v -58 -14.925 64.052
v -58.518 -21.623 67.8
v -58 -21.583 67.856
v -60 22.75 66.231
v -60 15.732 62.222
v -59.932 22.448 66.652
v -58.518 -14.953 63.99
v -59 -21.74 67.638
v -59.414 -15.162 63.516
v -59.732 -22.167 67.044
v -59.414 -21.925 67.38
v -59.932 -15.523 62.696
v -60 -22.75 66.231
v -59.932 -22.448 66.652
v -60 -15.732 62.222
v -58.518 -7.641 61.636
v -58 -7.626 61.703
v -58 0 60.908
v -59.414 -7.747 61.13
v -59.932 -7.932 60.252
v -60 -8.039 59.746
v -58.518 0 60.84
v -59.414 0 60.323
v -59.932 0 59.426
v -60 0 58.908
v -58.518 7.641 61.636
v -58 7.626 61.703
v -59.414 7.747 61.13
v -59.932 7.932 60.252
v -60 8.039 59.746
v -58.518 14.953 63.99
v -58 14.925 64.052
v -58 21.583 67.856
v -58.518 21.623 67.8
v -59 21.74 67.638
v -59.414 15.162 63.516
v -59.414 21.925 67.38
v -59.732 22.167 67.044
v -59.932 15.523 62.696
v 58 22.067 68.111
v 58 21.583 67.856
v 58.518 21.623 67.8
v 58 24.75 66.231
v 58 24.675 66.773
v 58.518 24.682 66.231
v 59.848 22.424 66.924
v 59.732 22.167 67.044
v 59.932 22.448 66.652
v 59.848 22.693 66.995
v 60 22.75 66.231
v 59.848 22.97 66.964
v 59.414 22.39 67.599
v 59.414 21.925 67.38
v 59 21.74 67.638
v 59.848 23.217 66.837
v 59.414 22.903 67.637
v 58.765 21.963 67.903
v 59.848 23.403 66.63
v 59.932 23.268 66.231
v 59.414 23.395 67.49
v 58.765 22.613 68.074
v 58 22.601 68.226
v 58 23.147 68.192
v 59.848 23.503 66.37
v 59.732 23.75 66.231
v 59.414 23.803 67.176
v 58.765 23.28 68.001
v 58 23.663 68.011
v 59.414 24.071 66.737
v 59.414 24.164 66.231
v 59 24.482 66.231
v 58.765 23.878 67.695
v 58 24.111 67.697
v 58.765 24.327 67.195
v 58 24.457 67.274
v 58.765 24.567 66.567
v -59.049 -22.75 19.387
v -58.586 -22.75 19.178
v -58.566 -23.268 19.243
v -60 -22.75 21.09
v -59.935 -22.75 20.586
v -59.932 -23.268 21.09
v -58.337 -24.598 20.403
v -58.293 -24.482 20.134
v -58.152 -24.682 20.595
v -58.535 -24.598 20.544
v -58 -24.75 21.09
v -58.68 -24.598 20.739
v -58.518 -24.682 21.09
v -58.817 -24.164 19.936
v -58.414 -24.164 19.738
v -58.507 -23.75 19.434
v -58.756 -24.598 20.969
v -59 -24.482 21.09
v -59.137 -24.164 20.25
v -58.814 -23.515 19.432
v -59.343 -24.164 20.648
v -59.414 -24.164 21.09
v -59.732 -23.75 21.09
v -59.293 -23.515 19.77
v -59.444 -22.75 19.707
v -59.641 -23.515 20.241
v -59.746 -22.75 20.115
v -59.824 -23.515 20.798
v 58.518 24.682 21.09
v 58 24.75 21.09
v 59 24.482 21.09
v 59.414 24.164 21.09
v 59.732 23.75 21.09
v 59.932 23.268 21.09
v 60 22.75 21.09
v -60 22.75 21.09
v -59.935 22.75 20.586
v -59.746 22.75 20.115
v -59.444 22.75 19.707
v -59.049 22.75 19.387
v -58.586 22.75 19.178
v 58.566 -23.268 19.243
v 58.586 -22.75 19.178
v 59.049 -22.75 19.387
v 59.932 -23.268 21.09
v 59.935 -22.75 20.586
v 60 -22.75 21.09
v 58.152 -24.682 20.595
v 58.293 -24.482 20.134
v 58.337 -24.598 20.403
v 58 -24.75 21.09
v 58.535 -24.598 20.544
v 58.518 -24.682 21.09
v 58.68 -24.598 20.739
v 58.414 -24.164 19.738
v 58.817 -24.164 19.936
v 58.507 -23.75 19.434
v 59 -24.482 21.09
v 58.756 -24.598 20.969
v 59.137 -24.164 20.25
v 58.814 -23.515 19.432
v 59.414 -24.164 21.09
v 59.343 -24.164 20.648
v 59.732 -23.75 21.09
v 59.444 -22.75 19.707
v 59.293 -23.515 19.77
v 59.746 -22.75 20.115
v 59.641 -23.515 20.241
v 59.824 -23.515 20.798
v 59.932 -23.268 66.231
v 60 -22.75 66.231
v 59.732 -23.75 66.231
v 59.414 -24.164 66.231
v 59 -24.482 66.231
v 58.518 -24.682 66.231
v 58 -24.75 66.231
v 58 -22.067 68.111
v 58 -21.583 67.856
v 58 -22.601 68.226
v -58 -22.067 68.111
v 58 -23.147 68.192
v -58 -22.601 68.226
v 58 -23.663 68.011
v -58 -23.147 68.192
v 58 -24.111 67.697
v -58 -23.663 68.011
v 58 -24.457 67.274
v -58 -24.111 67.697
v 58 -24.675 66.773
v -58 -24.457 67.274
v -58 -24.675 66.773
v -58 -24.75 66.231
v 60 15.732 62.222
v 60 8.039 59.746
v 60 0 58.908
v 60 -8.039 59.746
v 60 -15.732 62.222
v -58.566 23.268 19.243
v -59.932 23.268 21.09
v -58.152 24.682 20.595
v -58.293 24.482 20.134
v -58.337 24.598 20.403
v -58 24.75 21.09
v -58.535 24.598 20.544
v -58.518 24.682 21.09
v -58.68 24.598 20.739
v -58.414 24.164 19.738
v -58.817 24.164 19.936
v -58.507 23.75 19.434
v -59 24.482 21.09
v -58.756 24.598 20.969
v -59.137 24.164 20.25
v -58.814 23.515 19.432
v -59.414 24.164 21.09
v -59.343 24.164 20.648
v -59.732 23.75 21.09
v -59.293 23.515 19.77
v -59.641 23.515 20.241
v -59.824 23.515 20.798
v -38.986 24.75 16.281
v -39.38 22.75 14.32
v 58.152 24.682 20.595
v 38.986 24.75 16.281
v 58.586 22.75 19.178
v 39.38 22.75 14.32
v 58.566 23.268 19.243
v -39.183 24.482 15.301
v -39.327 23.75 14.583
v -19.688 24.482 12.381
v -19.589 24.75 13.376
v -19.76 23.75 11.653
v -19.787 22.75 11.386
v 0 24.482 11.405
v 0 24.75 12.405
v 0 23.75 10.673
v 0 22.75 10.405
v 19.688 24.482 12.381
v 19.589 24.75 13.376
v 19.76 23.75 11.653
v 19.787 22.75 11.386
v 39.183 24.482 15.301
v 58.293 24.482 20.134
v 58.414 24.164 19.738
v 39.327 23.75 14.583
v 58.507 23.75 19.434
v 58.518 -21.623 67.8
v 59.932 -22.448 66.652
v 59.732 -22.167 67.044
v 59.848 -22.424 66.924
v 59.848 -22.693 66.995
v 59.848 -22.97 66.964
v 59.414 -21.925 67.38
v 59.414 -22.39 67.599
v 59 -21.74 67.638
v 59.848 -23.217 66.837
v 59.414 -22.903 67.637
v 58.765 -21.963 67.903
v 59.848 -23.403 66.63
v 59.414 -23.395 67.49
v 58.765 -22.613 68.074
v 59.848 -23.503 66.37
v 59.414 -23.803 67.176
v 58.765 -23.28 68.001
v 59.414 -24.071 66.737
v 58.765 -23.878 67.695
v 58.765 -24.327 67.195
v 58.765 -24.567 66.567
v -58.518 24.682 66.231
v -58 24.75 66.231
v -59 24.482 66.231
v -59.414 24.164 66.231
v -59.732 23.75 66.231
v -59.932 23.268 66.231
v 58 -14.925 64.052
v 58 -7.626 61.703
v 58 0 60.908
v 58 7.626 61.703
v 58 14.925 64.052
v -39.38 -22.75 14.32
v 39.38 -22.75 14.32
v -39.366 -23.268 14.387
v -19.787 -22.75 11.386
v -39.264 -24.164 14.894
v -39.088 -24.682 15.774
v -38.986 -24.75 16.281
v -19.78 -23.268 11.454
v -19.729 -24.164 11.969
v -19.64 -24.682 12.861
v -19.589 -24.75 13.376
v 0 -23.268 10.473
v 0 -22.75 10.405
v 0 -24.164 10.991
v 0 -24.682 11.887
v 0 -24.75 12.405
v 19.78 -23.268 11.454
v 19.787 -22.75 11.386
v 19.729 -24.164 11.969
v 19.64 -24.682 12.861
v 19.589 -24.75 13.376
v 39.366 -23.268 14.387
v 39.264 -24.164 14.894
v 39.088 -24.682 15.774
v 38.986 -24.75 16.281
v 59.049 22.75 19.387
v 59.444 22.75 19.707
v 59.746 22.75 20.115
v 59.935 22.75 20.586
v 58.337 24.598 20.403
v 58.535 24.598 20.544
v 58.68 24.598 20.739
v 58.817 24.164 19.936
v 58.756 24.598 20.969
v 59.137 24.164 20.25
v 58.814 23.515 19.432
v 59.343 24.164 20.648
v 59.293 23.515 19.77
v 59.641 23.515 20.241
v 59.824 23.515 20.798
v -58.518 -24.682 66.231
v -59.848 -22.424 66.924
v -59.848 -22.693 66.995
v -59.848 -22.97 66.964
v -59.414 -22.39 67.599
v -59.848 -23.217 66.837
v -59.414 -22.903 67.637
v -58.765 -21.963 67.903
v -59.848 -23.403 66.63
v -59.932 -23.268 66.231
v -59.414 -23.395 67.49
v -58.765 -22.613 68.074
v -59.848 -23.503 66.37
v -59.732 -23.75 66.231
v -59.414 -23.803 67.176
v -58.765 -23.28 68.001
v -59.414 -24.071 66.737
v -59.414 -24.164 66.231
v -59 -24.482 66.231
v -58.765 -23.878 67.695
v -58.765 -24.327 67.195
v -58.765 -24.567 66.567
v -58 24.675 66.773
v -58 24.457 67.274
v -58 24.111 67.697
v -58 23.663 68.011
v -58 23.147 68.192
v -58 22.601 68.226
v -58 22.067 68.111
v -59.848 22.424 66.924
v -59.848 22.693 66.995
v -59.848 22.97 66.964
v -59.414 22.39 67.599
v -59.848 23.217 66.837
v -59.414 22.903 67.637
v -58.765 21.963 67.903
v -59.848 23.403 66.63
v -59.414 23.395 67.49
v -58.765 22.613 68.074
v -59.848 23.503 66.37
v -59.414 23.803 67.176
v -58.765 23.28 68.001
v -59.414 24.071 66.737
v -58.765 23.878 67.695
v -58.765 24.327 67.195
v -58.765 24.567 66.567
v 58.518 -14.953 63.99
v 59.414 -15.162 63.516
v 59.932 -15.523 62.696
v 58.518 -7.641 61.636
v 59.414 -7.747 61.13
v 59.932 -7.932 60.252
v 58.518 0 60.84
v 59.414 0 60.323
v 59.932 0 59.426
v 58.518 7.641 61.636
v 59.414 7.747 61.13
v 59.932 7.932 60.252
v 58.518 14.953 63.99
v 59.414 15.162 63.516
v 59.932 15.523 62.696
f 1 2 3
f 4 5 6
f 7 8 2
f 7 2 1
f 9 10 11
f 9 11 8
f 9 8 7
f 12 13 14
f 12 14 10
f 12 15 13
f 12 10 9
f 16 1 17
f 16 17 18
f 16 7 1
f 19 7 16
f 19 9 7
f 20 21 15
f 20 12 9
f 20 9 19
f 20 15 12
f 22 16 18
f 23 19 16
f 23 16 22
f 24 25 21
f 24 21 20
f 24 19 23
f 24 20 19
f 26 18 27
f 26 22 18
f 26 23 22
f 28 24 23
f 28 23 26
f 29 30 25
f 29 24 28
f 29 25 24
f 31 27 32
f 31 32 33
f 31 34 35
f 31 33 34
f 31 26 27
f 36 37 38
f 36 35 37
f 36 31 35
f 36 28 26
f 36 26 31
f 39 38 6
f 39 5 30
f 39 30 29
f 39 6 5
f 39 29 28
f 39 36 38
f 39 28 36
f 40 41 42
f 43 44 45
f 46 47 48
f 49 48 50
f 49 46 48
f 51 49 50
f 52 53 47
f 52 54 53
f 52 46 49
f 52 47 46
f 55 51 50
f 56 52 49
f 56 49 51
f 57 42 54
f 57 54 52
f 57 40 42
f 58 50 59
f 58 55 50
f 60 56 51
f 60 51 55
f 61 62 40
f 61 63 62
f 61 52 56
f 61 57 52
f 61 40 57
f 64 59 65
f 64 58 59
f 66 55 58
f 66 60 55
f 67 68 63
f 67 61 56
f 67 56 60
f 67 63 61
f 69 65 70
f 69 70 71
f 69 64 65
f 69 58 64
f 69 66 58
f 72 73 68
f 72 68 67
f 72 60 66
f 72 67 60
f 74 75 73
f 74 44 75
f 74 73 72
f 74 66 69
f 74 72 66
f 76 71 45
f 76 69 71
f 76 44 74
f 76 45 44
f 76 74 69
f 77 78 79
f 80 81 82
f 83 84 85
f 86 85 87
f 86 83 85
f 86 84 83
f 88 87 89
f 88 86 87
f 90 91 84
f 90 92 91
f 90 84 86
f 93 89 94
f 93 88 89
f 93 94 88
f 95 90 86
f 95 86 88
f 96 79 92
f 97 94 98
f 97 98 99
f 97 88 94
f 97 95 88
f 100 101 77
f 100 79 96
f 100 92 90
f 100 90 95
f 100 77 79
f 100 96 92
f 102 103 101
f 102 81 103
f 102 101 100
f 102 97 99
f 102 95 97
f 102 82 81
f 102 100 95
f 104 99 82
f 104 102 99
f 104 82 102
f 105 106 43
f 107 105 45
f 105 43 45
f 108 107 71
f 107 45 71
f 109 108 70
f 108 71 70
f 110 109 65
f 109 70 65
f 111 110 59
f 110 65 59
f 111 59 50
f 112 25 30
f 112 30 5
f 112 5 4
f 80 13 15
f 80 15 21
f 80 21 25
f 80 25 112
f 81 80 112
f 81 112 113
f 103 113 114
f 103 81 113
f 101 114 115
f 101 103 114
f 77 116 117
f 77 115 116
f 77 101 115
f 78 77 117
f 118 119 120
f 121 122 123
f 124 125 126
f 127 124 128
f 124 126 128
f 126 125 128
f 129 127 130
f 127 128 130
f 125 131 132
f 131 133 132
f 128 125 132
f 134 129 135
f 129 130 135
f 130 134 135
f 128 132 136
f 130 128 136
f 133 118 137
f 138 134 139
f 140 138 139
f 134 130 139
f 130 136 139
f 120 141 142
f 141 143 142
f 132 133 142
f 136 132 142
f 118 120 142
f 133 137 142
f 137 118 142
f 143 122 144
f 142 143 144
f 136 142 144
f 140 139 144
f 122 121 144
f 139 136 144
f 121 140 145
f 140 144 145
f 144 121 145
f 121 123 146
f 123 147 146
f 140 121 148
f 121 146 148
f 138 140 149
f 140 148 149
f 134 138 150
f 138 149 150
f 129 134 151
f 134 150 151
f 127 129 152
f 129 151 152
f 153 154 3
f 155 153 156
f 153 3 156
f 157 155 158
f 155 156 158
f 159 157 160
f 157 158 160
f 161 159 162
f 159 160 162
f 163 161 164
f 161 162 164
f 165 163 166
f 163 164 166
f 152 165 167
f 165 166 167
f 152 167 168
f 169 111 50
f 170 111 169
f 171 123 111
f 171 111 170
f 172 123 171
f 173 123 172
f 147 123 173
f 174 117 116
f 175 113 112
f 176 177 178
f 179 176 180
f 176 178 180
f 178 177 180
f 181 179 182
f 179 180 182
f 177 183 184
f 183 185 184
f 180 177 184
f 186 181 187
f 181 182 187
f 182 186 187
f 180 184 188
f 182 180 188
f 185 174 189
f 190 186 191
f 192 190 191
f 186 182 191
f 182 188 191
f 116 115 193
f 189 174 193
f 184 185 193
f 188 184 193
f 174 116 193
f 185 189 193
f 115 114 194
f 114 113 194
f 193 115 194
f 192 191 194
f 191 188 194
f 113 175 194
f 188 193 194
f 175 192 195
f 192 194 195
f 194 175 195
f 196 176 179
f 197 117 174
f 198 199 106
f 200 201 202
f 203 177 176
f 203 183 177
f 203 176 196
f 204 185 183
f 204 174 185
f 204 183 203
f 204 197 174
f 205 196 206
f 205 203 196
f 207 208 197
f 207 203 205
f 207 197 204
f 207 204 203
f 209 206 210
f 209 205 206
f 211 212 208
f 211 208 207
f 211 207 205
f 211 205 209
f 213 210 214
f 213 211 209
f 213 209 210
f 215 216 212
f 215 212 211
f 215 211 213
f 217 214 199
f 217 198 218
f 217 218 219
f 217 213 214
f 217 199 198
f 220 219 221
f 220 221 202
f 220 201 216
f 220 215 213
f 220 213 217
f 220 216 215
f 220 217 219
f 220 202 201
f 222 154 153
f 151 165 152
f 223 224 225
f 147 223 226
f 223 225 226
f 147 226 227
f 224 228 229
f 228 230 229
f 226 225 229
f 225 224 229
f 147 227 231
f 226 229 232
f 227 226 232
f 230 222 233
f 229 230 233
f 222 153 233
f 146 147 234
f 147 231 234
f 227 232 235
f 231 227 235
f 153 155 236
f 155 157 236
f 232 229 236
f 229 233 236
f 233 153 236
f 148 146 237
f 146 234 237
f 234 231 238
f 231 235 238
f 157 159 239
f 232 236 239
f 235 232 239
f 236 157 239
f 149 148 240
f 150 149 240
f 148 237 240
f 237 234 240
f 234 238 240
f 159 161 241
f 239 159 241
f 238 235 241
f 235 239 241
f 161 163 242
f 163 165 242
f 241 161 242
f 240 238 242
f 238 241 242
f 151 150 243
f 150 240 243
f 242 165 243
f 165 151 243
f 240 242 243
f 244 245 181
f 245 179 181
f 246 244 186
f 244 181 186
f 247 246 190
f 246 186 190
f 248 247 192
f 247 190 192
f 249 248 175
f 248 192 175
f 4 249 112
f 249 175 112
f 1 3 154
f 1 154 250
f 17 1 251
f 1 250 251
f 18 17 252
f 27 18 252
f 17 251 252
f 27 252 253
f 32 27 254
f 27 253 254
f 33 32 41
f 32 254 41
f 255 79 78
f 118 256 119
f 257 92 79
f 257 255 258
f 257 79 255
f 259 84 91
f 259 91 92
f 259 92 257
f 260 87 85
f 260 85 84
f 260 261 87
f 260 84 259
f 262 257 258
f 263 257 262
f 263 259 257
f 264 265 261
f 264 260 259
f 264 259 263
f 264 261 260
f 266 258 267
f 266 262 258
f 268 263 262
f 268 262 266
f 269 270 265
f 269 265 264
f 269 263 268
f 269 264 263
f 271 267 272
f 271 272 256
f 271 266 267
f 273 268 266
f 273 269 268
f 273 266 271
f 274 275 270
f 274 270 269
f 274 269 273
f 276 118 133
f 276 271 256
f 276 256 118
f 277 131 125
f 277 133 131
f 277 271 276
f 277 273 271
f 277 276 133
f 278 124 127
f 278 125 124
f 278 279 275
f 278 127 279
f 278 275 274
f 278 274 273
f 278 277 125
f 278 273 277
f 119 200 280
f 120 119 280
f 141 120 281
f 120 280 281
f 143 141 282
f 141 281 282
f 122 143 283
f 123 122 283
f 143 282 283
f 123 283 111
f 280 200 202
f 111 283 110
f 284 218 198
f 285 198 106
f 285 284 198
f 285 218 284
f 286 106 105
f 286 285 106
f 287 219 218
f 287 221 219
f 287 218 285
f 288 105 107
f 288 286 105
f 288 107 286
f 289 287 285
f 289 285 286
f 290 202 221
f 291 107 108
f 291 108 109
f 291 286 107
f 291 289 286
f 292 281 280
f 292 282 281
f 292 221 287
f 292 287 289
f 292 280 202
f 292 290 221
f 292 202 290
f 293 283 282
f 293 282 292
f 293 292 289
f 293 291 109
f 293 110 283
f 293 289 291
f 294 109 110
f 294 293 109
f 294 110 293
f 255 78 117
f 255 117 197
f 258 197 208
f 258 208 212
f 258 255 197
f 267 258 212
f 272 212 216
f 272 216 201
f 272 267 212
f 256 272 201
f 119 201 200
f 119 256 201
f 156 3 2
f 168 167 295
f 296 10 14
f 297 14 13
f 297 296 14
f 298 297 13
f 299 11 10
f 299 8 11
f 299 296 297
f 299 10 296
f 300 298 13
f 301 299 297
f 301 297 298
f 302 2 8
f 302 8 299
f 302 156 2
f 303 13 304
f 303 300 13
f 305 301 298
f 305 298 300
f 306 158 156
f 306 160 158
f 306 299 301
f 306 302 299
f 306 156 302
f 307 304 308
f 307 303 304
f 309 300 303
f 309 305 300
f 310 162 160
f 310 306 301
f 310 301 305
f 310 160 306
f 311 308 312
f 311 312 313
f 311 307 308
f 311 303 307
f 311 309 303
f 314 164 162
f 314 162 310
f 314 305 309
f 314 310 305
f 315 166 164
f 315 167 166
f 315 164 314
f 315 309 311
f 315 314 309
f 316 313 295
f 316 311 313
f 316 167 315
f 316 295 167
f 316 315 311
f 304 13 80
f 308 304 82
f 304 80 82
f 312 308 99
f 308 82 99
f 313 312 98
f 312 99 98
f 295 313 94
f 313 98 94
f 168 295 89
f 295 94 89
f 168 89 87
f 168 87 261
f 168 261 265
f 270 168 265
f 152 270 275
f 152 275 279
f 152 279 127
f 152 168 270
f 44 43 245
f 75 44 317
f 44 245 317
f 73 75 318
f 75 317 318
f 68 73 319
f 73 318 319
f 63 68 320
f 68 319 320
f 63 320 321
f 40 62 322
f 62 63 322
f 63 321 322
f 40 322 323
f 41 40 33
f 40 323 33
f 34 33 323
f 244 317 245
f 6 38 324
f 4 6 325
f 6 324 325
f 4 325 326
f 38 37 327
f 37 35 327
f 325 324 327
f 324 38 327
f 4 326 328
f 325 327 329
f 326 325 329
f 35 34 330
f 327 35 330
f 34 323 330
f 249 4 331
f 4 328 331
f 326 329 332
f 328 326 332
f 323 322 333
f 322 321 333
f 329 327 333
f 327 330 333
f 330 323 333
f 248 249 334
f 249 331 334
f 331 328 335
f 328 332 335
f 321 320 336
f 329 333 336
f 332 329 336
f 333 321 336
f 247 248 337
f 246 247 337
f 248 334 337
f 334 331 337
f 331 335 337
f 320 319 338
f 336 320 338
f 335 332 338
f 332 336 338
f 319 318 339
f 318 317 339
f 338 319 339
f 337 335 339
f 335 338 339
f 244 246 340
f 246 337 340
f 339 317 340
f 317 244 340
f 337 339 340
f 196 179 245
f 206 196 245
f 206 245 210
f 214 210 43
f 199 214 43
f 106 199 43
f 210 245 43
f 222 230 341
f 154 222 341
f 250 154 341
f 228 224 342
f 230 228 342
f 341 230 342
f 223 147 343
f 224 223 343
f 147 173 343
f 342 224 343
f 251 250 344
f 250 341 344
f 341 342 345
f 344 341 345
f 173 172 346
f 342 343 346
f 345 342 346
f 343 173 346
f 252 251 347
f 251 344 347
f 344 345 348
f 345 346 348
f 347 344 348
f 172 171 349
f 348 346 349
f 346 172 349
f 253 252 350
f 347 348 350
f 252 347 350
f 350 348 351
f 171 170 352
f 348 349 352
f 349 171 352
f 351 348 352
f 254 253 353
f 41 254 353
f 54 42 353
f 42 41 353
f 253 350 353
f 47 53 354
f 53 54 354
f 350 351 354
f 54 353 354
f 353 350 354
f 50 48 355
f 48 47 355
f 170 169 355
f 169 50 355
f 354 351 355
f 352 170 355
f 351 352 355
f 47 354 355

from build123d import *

# Parameters (mm, degrees)
F1_DEPTH = 24.75
F3_DEPTH = 120
F4_R     = 2


with BuildPart() as f1:
    # F0 (on Front) → F1 (new body, symmetric)
    with BuildSketch(Plane.XZ):
        with BuildLine():
            Line((60, 70.4049621774), (-60, 70.4049621774))
            Line((-60, 70.4049621774), (-60, 19.617121894))
            ThreePointArc((-60, 19.617121894), (0, 10.4049621774), (60, 19.617121894))
            Line((60, 19.617121894), (60, 70.4049621774))
        make_face()
    extrude(amount=F1_DEPTH, both=True)

    # F2 (on face) → F3 (cut)
    with BuildSketch(Plane.YZ.offset(60)):
        with BuildLine():
            Line((24.75, 70.4049621774), (-24.75, 70.4049621774))
            ThreePointArc((-24.75, 70.4049621774), (0, 60.908371057), (24.75, 70.4049621774))
        make_face()
    extrude(amount=-F3_DEPTH, mode=Mode.SUBTRACT)

    # F4
    f4_edges = [f1.edges().sort_by_distance(p)[0] for p in [
        (0, -24.75, 70.404962),
        (0, 24.75, 70.404962),
        (60, 0, 60.908371),
        (60, -24.75, 45.011042),
        (60, 24.75, 45.011042),
        (60, 0, 19.617122),
        (-60, 0, 60.908371),
        (-60, -24.75, 45.011042),
        (-60, 24.75, 45.011042),
        (-60, 0, 19.617122),
        (0, -24.75, 10.404962),
        (0, 24.75, 10.404962),
    ]]
    fillet(f4_edges, radius=F4_R)


solid = f1.part
